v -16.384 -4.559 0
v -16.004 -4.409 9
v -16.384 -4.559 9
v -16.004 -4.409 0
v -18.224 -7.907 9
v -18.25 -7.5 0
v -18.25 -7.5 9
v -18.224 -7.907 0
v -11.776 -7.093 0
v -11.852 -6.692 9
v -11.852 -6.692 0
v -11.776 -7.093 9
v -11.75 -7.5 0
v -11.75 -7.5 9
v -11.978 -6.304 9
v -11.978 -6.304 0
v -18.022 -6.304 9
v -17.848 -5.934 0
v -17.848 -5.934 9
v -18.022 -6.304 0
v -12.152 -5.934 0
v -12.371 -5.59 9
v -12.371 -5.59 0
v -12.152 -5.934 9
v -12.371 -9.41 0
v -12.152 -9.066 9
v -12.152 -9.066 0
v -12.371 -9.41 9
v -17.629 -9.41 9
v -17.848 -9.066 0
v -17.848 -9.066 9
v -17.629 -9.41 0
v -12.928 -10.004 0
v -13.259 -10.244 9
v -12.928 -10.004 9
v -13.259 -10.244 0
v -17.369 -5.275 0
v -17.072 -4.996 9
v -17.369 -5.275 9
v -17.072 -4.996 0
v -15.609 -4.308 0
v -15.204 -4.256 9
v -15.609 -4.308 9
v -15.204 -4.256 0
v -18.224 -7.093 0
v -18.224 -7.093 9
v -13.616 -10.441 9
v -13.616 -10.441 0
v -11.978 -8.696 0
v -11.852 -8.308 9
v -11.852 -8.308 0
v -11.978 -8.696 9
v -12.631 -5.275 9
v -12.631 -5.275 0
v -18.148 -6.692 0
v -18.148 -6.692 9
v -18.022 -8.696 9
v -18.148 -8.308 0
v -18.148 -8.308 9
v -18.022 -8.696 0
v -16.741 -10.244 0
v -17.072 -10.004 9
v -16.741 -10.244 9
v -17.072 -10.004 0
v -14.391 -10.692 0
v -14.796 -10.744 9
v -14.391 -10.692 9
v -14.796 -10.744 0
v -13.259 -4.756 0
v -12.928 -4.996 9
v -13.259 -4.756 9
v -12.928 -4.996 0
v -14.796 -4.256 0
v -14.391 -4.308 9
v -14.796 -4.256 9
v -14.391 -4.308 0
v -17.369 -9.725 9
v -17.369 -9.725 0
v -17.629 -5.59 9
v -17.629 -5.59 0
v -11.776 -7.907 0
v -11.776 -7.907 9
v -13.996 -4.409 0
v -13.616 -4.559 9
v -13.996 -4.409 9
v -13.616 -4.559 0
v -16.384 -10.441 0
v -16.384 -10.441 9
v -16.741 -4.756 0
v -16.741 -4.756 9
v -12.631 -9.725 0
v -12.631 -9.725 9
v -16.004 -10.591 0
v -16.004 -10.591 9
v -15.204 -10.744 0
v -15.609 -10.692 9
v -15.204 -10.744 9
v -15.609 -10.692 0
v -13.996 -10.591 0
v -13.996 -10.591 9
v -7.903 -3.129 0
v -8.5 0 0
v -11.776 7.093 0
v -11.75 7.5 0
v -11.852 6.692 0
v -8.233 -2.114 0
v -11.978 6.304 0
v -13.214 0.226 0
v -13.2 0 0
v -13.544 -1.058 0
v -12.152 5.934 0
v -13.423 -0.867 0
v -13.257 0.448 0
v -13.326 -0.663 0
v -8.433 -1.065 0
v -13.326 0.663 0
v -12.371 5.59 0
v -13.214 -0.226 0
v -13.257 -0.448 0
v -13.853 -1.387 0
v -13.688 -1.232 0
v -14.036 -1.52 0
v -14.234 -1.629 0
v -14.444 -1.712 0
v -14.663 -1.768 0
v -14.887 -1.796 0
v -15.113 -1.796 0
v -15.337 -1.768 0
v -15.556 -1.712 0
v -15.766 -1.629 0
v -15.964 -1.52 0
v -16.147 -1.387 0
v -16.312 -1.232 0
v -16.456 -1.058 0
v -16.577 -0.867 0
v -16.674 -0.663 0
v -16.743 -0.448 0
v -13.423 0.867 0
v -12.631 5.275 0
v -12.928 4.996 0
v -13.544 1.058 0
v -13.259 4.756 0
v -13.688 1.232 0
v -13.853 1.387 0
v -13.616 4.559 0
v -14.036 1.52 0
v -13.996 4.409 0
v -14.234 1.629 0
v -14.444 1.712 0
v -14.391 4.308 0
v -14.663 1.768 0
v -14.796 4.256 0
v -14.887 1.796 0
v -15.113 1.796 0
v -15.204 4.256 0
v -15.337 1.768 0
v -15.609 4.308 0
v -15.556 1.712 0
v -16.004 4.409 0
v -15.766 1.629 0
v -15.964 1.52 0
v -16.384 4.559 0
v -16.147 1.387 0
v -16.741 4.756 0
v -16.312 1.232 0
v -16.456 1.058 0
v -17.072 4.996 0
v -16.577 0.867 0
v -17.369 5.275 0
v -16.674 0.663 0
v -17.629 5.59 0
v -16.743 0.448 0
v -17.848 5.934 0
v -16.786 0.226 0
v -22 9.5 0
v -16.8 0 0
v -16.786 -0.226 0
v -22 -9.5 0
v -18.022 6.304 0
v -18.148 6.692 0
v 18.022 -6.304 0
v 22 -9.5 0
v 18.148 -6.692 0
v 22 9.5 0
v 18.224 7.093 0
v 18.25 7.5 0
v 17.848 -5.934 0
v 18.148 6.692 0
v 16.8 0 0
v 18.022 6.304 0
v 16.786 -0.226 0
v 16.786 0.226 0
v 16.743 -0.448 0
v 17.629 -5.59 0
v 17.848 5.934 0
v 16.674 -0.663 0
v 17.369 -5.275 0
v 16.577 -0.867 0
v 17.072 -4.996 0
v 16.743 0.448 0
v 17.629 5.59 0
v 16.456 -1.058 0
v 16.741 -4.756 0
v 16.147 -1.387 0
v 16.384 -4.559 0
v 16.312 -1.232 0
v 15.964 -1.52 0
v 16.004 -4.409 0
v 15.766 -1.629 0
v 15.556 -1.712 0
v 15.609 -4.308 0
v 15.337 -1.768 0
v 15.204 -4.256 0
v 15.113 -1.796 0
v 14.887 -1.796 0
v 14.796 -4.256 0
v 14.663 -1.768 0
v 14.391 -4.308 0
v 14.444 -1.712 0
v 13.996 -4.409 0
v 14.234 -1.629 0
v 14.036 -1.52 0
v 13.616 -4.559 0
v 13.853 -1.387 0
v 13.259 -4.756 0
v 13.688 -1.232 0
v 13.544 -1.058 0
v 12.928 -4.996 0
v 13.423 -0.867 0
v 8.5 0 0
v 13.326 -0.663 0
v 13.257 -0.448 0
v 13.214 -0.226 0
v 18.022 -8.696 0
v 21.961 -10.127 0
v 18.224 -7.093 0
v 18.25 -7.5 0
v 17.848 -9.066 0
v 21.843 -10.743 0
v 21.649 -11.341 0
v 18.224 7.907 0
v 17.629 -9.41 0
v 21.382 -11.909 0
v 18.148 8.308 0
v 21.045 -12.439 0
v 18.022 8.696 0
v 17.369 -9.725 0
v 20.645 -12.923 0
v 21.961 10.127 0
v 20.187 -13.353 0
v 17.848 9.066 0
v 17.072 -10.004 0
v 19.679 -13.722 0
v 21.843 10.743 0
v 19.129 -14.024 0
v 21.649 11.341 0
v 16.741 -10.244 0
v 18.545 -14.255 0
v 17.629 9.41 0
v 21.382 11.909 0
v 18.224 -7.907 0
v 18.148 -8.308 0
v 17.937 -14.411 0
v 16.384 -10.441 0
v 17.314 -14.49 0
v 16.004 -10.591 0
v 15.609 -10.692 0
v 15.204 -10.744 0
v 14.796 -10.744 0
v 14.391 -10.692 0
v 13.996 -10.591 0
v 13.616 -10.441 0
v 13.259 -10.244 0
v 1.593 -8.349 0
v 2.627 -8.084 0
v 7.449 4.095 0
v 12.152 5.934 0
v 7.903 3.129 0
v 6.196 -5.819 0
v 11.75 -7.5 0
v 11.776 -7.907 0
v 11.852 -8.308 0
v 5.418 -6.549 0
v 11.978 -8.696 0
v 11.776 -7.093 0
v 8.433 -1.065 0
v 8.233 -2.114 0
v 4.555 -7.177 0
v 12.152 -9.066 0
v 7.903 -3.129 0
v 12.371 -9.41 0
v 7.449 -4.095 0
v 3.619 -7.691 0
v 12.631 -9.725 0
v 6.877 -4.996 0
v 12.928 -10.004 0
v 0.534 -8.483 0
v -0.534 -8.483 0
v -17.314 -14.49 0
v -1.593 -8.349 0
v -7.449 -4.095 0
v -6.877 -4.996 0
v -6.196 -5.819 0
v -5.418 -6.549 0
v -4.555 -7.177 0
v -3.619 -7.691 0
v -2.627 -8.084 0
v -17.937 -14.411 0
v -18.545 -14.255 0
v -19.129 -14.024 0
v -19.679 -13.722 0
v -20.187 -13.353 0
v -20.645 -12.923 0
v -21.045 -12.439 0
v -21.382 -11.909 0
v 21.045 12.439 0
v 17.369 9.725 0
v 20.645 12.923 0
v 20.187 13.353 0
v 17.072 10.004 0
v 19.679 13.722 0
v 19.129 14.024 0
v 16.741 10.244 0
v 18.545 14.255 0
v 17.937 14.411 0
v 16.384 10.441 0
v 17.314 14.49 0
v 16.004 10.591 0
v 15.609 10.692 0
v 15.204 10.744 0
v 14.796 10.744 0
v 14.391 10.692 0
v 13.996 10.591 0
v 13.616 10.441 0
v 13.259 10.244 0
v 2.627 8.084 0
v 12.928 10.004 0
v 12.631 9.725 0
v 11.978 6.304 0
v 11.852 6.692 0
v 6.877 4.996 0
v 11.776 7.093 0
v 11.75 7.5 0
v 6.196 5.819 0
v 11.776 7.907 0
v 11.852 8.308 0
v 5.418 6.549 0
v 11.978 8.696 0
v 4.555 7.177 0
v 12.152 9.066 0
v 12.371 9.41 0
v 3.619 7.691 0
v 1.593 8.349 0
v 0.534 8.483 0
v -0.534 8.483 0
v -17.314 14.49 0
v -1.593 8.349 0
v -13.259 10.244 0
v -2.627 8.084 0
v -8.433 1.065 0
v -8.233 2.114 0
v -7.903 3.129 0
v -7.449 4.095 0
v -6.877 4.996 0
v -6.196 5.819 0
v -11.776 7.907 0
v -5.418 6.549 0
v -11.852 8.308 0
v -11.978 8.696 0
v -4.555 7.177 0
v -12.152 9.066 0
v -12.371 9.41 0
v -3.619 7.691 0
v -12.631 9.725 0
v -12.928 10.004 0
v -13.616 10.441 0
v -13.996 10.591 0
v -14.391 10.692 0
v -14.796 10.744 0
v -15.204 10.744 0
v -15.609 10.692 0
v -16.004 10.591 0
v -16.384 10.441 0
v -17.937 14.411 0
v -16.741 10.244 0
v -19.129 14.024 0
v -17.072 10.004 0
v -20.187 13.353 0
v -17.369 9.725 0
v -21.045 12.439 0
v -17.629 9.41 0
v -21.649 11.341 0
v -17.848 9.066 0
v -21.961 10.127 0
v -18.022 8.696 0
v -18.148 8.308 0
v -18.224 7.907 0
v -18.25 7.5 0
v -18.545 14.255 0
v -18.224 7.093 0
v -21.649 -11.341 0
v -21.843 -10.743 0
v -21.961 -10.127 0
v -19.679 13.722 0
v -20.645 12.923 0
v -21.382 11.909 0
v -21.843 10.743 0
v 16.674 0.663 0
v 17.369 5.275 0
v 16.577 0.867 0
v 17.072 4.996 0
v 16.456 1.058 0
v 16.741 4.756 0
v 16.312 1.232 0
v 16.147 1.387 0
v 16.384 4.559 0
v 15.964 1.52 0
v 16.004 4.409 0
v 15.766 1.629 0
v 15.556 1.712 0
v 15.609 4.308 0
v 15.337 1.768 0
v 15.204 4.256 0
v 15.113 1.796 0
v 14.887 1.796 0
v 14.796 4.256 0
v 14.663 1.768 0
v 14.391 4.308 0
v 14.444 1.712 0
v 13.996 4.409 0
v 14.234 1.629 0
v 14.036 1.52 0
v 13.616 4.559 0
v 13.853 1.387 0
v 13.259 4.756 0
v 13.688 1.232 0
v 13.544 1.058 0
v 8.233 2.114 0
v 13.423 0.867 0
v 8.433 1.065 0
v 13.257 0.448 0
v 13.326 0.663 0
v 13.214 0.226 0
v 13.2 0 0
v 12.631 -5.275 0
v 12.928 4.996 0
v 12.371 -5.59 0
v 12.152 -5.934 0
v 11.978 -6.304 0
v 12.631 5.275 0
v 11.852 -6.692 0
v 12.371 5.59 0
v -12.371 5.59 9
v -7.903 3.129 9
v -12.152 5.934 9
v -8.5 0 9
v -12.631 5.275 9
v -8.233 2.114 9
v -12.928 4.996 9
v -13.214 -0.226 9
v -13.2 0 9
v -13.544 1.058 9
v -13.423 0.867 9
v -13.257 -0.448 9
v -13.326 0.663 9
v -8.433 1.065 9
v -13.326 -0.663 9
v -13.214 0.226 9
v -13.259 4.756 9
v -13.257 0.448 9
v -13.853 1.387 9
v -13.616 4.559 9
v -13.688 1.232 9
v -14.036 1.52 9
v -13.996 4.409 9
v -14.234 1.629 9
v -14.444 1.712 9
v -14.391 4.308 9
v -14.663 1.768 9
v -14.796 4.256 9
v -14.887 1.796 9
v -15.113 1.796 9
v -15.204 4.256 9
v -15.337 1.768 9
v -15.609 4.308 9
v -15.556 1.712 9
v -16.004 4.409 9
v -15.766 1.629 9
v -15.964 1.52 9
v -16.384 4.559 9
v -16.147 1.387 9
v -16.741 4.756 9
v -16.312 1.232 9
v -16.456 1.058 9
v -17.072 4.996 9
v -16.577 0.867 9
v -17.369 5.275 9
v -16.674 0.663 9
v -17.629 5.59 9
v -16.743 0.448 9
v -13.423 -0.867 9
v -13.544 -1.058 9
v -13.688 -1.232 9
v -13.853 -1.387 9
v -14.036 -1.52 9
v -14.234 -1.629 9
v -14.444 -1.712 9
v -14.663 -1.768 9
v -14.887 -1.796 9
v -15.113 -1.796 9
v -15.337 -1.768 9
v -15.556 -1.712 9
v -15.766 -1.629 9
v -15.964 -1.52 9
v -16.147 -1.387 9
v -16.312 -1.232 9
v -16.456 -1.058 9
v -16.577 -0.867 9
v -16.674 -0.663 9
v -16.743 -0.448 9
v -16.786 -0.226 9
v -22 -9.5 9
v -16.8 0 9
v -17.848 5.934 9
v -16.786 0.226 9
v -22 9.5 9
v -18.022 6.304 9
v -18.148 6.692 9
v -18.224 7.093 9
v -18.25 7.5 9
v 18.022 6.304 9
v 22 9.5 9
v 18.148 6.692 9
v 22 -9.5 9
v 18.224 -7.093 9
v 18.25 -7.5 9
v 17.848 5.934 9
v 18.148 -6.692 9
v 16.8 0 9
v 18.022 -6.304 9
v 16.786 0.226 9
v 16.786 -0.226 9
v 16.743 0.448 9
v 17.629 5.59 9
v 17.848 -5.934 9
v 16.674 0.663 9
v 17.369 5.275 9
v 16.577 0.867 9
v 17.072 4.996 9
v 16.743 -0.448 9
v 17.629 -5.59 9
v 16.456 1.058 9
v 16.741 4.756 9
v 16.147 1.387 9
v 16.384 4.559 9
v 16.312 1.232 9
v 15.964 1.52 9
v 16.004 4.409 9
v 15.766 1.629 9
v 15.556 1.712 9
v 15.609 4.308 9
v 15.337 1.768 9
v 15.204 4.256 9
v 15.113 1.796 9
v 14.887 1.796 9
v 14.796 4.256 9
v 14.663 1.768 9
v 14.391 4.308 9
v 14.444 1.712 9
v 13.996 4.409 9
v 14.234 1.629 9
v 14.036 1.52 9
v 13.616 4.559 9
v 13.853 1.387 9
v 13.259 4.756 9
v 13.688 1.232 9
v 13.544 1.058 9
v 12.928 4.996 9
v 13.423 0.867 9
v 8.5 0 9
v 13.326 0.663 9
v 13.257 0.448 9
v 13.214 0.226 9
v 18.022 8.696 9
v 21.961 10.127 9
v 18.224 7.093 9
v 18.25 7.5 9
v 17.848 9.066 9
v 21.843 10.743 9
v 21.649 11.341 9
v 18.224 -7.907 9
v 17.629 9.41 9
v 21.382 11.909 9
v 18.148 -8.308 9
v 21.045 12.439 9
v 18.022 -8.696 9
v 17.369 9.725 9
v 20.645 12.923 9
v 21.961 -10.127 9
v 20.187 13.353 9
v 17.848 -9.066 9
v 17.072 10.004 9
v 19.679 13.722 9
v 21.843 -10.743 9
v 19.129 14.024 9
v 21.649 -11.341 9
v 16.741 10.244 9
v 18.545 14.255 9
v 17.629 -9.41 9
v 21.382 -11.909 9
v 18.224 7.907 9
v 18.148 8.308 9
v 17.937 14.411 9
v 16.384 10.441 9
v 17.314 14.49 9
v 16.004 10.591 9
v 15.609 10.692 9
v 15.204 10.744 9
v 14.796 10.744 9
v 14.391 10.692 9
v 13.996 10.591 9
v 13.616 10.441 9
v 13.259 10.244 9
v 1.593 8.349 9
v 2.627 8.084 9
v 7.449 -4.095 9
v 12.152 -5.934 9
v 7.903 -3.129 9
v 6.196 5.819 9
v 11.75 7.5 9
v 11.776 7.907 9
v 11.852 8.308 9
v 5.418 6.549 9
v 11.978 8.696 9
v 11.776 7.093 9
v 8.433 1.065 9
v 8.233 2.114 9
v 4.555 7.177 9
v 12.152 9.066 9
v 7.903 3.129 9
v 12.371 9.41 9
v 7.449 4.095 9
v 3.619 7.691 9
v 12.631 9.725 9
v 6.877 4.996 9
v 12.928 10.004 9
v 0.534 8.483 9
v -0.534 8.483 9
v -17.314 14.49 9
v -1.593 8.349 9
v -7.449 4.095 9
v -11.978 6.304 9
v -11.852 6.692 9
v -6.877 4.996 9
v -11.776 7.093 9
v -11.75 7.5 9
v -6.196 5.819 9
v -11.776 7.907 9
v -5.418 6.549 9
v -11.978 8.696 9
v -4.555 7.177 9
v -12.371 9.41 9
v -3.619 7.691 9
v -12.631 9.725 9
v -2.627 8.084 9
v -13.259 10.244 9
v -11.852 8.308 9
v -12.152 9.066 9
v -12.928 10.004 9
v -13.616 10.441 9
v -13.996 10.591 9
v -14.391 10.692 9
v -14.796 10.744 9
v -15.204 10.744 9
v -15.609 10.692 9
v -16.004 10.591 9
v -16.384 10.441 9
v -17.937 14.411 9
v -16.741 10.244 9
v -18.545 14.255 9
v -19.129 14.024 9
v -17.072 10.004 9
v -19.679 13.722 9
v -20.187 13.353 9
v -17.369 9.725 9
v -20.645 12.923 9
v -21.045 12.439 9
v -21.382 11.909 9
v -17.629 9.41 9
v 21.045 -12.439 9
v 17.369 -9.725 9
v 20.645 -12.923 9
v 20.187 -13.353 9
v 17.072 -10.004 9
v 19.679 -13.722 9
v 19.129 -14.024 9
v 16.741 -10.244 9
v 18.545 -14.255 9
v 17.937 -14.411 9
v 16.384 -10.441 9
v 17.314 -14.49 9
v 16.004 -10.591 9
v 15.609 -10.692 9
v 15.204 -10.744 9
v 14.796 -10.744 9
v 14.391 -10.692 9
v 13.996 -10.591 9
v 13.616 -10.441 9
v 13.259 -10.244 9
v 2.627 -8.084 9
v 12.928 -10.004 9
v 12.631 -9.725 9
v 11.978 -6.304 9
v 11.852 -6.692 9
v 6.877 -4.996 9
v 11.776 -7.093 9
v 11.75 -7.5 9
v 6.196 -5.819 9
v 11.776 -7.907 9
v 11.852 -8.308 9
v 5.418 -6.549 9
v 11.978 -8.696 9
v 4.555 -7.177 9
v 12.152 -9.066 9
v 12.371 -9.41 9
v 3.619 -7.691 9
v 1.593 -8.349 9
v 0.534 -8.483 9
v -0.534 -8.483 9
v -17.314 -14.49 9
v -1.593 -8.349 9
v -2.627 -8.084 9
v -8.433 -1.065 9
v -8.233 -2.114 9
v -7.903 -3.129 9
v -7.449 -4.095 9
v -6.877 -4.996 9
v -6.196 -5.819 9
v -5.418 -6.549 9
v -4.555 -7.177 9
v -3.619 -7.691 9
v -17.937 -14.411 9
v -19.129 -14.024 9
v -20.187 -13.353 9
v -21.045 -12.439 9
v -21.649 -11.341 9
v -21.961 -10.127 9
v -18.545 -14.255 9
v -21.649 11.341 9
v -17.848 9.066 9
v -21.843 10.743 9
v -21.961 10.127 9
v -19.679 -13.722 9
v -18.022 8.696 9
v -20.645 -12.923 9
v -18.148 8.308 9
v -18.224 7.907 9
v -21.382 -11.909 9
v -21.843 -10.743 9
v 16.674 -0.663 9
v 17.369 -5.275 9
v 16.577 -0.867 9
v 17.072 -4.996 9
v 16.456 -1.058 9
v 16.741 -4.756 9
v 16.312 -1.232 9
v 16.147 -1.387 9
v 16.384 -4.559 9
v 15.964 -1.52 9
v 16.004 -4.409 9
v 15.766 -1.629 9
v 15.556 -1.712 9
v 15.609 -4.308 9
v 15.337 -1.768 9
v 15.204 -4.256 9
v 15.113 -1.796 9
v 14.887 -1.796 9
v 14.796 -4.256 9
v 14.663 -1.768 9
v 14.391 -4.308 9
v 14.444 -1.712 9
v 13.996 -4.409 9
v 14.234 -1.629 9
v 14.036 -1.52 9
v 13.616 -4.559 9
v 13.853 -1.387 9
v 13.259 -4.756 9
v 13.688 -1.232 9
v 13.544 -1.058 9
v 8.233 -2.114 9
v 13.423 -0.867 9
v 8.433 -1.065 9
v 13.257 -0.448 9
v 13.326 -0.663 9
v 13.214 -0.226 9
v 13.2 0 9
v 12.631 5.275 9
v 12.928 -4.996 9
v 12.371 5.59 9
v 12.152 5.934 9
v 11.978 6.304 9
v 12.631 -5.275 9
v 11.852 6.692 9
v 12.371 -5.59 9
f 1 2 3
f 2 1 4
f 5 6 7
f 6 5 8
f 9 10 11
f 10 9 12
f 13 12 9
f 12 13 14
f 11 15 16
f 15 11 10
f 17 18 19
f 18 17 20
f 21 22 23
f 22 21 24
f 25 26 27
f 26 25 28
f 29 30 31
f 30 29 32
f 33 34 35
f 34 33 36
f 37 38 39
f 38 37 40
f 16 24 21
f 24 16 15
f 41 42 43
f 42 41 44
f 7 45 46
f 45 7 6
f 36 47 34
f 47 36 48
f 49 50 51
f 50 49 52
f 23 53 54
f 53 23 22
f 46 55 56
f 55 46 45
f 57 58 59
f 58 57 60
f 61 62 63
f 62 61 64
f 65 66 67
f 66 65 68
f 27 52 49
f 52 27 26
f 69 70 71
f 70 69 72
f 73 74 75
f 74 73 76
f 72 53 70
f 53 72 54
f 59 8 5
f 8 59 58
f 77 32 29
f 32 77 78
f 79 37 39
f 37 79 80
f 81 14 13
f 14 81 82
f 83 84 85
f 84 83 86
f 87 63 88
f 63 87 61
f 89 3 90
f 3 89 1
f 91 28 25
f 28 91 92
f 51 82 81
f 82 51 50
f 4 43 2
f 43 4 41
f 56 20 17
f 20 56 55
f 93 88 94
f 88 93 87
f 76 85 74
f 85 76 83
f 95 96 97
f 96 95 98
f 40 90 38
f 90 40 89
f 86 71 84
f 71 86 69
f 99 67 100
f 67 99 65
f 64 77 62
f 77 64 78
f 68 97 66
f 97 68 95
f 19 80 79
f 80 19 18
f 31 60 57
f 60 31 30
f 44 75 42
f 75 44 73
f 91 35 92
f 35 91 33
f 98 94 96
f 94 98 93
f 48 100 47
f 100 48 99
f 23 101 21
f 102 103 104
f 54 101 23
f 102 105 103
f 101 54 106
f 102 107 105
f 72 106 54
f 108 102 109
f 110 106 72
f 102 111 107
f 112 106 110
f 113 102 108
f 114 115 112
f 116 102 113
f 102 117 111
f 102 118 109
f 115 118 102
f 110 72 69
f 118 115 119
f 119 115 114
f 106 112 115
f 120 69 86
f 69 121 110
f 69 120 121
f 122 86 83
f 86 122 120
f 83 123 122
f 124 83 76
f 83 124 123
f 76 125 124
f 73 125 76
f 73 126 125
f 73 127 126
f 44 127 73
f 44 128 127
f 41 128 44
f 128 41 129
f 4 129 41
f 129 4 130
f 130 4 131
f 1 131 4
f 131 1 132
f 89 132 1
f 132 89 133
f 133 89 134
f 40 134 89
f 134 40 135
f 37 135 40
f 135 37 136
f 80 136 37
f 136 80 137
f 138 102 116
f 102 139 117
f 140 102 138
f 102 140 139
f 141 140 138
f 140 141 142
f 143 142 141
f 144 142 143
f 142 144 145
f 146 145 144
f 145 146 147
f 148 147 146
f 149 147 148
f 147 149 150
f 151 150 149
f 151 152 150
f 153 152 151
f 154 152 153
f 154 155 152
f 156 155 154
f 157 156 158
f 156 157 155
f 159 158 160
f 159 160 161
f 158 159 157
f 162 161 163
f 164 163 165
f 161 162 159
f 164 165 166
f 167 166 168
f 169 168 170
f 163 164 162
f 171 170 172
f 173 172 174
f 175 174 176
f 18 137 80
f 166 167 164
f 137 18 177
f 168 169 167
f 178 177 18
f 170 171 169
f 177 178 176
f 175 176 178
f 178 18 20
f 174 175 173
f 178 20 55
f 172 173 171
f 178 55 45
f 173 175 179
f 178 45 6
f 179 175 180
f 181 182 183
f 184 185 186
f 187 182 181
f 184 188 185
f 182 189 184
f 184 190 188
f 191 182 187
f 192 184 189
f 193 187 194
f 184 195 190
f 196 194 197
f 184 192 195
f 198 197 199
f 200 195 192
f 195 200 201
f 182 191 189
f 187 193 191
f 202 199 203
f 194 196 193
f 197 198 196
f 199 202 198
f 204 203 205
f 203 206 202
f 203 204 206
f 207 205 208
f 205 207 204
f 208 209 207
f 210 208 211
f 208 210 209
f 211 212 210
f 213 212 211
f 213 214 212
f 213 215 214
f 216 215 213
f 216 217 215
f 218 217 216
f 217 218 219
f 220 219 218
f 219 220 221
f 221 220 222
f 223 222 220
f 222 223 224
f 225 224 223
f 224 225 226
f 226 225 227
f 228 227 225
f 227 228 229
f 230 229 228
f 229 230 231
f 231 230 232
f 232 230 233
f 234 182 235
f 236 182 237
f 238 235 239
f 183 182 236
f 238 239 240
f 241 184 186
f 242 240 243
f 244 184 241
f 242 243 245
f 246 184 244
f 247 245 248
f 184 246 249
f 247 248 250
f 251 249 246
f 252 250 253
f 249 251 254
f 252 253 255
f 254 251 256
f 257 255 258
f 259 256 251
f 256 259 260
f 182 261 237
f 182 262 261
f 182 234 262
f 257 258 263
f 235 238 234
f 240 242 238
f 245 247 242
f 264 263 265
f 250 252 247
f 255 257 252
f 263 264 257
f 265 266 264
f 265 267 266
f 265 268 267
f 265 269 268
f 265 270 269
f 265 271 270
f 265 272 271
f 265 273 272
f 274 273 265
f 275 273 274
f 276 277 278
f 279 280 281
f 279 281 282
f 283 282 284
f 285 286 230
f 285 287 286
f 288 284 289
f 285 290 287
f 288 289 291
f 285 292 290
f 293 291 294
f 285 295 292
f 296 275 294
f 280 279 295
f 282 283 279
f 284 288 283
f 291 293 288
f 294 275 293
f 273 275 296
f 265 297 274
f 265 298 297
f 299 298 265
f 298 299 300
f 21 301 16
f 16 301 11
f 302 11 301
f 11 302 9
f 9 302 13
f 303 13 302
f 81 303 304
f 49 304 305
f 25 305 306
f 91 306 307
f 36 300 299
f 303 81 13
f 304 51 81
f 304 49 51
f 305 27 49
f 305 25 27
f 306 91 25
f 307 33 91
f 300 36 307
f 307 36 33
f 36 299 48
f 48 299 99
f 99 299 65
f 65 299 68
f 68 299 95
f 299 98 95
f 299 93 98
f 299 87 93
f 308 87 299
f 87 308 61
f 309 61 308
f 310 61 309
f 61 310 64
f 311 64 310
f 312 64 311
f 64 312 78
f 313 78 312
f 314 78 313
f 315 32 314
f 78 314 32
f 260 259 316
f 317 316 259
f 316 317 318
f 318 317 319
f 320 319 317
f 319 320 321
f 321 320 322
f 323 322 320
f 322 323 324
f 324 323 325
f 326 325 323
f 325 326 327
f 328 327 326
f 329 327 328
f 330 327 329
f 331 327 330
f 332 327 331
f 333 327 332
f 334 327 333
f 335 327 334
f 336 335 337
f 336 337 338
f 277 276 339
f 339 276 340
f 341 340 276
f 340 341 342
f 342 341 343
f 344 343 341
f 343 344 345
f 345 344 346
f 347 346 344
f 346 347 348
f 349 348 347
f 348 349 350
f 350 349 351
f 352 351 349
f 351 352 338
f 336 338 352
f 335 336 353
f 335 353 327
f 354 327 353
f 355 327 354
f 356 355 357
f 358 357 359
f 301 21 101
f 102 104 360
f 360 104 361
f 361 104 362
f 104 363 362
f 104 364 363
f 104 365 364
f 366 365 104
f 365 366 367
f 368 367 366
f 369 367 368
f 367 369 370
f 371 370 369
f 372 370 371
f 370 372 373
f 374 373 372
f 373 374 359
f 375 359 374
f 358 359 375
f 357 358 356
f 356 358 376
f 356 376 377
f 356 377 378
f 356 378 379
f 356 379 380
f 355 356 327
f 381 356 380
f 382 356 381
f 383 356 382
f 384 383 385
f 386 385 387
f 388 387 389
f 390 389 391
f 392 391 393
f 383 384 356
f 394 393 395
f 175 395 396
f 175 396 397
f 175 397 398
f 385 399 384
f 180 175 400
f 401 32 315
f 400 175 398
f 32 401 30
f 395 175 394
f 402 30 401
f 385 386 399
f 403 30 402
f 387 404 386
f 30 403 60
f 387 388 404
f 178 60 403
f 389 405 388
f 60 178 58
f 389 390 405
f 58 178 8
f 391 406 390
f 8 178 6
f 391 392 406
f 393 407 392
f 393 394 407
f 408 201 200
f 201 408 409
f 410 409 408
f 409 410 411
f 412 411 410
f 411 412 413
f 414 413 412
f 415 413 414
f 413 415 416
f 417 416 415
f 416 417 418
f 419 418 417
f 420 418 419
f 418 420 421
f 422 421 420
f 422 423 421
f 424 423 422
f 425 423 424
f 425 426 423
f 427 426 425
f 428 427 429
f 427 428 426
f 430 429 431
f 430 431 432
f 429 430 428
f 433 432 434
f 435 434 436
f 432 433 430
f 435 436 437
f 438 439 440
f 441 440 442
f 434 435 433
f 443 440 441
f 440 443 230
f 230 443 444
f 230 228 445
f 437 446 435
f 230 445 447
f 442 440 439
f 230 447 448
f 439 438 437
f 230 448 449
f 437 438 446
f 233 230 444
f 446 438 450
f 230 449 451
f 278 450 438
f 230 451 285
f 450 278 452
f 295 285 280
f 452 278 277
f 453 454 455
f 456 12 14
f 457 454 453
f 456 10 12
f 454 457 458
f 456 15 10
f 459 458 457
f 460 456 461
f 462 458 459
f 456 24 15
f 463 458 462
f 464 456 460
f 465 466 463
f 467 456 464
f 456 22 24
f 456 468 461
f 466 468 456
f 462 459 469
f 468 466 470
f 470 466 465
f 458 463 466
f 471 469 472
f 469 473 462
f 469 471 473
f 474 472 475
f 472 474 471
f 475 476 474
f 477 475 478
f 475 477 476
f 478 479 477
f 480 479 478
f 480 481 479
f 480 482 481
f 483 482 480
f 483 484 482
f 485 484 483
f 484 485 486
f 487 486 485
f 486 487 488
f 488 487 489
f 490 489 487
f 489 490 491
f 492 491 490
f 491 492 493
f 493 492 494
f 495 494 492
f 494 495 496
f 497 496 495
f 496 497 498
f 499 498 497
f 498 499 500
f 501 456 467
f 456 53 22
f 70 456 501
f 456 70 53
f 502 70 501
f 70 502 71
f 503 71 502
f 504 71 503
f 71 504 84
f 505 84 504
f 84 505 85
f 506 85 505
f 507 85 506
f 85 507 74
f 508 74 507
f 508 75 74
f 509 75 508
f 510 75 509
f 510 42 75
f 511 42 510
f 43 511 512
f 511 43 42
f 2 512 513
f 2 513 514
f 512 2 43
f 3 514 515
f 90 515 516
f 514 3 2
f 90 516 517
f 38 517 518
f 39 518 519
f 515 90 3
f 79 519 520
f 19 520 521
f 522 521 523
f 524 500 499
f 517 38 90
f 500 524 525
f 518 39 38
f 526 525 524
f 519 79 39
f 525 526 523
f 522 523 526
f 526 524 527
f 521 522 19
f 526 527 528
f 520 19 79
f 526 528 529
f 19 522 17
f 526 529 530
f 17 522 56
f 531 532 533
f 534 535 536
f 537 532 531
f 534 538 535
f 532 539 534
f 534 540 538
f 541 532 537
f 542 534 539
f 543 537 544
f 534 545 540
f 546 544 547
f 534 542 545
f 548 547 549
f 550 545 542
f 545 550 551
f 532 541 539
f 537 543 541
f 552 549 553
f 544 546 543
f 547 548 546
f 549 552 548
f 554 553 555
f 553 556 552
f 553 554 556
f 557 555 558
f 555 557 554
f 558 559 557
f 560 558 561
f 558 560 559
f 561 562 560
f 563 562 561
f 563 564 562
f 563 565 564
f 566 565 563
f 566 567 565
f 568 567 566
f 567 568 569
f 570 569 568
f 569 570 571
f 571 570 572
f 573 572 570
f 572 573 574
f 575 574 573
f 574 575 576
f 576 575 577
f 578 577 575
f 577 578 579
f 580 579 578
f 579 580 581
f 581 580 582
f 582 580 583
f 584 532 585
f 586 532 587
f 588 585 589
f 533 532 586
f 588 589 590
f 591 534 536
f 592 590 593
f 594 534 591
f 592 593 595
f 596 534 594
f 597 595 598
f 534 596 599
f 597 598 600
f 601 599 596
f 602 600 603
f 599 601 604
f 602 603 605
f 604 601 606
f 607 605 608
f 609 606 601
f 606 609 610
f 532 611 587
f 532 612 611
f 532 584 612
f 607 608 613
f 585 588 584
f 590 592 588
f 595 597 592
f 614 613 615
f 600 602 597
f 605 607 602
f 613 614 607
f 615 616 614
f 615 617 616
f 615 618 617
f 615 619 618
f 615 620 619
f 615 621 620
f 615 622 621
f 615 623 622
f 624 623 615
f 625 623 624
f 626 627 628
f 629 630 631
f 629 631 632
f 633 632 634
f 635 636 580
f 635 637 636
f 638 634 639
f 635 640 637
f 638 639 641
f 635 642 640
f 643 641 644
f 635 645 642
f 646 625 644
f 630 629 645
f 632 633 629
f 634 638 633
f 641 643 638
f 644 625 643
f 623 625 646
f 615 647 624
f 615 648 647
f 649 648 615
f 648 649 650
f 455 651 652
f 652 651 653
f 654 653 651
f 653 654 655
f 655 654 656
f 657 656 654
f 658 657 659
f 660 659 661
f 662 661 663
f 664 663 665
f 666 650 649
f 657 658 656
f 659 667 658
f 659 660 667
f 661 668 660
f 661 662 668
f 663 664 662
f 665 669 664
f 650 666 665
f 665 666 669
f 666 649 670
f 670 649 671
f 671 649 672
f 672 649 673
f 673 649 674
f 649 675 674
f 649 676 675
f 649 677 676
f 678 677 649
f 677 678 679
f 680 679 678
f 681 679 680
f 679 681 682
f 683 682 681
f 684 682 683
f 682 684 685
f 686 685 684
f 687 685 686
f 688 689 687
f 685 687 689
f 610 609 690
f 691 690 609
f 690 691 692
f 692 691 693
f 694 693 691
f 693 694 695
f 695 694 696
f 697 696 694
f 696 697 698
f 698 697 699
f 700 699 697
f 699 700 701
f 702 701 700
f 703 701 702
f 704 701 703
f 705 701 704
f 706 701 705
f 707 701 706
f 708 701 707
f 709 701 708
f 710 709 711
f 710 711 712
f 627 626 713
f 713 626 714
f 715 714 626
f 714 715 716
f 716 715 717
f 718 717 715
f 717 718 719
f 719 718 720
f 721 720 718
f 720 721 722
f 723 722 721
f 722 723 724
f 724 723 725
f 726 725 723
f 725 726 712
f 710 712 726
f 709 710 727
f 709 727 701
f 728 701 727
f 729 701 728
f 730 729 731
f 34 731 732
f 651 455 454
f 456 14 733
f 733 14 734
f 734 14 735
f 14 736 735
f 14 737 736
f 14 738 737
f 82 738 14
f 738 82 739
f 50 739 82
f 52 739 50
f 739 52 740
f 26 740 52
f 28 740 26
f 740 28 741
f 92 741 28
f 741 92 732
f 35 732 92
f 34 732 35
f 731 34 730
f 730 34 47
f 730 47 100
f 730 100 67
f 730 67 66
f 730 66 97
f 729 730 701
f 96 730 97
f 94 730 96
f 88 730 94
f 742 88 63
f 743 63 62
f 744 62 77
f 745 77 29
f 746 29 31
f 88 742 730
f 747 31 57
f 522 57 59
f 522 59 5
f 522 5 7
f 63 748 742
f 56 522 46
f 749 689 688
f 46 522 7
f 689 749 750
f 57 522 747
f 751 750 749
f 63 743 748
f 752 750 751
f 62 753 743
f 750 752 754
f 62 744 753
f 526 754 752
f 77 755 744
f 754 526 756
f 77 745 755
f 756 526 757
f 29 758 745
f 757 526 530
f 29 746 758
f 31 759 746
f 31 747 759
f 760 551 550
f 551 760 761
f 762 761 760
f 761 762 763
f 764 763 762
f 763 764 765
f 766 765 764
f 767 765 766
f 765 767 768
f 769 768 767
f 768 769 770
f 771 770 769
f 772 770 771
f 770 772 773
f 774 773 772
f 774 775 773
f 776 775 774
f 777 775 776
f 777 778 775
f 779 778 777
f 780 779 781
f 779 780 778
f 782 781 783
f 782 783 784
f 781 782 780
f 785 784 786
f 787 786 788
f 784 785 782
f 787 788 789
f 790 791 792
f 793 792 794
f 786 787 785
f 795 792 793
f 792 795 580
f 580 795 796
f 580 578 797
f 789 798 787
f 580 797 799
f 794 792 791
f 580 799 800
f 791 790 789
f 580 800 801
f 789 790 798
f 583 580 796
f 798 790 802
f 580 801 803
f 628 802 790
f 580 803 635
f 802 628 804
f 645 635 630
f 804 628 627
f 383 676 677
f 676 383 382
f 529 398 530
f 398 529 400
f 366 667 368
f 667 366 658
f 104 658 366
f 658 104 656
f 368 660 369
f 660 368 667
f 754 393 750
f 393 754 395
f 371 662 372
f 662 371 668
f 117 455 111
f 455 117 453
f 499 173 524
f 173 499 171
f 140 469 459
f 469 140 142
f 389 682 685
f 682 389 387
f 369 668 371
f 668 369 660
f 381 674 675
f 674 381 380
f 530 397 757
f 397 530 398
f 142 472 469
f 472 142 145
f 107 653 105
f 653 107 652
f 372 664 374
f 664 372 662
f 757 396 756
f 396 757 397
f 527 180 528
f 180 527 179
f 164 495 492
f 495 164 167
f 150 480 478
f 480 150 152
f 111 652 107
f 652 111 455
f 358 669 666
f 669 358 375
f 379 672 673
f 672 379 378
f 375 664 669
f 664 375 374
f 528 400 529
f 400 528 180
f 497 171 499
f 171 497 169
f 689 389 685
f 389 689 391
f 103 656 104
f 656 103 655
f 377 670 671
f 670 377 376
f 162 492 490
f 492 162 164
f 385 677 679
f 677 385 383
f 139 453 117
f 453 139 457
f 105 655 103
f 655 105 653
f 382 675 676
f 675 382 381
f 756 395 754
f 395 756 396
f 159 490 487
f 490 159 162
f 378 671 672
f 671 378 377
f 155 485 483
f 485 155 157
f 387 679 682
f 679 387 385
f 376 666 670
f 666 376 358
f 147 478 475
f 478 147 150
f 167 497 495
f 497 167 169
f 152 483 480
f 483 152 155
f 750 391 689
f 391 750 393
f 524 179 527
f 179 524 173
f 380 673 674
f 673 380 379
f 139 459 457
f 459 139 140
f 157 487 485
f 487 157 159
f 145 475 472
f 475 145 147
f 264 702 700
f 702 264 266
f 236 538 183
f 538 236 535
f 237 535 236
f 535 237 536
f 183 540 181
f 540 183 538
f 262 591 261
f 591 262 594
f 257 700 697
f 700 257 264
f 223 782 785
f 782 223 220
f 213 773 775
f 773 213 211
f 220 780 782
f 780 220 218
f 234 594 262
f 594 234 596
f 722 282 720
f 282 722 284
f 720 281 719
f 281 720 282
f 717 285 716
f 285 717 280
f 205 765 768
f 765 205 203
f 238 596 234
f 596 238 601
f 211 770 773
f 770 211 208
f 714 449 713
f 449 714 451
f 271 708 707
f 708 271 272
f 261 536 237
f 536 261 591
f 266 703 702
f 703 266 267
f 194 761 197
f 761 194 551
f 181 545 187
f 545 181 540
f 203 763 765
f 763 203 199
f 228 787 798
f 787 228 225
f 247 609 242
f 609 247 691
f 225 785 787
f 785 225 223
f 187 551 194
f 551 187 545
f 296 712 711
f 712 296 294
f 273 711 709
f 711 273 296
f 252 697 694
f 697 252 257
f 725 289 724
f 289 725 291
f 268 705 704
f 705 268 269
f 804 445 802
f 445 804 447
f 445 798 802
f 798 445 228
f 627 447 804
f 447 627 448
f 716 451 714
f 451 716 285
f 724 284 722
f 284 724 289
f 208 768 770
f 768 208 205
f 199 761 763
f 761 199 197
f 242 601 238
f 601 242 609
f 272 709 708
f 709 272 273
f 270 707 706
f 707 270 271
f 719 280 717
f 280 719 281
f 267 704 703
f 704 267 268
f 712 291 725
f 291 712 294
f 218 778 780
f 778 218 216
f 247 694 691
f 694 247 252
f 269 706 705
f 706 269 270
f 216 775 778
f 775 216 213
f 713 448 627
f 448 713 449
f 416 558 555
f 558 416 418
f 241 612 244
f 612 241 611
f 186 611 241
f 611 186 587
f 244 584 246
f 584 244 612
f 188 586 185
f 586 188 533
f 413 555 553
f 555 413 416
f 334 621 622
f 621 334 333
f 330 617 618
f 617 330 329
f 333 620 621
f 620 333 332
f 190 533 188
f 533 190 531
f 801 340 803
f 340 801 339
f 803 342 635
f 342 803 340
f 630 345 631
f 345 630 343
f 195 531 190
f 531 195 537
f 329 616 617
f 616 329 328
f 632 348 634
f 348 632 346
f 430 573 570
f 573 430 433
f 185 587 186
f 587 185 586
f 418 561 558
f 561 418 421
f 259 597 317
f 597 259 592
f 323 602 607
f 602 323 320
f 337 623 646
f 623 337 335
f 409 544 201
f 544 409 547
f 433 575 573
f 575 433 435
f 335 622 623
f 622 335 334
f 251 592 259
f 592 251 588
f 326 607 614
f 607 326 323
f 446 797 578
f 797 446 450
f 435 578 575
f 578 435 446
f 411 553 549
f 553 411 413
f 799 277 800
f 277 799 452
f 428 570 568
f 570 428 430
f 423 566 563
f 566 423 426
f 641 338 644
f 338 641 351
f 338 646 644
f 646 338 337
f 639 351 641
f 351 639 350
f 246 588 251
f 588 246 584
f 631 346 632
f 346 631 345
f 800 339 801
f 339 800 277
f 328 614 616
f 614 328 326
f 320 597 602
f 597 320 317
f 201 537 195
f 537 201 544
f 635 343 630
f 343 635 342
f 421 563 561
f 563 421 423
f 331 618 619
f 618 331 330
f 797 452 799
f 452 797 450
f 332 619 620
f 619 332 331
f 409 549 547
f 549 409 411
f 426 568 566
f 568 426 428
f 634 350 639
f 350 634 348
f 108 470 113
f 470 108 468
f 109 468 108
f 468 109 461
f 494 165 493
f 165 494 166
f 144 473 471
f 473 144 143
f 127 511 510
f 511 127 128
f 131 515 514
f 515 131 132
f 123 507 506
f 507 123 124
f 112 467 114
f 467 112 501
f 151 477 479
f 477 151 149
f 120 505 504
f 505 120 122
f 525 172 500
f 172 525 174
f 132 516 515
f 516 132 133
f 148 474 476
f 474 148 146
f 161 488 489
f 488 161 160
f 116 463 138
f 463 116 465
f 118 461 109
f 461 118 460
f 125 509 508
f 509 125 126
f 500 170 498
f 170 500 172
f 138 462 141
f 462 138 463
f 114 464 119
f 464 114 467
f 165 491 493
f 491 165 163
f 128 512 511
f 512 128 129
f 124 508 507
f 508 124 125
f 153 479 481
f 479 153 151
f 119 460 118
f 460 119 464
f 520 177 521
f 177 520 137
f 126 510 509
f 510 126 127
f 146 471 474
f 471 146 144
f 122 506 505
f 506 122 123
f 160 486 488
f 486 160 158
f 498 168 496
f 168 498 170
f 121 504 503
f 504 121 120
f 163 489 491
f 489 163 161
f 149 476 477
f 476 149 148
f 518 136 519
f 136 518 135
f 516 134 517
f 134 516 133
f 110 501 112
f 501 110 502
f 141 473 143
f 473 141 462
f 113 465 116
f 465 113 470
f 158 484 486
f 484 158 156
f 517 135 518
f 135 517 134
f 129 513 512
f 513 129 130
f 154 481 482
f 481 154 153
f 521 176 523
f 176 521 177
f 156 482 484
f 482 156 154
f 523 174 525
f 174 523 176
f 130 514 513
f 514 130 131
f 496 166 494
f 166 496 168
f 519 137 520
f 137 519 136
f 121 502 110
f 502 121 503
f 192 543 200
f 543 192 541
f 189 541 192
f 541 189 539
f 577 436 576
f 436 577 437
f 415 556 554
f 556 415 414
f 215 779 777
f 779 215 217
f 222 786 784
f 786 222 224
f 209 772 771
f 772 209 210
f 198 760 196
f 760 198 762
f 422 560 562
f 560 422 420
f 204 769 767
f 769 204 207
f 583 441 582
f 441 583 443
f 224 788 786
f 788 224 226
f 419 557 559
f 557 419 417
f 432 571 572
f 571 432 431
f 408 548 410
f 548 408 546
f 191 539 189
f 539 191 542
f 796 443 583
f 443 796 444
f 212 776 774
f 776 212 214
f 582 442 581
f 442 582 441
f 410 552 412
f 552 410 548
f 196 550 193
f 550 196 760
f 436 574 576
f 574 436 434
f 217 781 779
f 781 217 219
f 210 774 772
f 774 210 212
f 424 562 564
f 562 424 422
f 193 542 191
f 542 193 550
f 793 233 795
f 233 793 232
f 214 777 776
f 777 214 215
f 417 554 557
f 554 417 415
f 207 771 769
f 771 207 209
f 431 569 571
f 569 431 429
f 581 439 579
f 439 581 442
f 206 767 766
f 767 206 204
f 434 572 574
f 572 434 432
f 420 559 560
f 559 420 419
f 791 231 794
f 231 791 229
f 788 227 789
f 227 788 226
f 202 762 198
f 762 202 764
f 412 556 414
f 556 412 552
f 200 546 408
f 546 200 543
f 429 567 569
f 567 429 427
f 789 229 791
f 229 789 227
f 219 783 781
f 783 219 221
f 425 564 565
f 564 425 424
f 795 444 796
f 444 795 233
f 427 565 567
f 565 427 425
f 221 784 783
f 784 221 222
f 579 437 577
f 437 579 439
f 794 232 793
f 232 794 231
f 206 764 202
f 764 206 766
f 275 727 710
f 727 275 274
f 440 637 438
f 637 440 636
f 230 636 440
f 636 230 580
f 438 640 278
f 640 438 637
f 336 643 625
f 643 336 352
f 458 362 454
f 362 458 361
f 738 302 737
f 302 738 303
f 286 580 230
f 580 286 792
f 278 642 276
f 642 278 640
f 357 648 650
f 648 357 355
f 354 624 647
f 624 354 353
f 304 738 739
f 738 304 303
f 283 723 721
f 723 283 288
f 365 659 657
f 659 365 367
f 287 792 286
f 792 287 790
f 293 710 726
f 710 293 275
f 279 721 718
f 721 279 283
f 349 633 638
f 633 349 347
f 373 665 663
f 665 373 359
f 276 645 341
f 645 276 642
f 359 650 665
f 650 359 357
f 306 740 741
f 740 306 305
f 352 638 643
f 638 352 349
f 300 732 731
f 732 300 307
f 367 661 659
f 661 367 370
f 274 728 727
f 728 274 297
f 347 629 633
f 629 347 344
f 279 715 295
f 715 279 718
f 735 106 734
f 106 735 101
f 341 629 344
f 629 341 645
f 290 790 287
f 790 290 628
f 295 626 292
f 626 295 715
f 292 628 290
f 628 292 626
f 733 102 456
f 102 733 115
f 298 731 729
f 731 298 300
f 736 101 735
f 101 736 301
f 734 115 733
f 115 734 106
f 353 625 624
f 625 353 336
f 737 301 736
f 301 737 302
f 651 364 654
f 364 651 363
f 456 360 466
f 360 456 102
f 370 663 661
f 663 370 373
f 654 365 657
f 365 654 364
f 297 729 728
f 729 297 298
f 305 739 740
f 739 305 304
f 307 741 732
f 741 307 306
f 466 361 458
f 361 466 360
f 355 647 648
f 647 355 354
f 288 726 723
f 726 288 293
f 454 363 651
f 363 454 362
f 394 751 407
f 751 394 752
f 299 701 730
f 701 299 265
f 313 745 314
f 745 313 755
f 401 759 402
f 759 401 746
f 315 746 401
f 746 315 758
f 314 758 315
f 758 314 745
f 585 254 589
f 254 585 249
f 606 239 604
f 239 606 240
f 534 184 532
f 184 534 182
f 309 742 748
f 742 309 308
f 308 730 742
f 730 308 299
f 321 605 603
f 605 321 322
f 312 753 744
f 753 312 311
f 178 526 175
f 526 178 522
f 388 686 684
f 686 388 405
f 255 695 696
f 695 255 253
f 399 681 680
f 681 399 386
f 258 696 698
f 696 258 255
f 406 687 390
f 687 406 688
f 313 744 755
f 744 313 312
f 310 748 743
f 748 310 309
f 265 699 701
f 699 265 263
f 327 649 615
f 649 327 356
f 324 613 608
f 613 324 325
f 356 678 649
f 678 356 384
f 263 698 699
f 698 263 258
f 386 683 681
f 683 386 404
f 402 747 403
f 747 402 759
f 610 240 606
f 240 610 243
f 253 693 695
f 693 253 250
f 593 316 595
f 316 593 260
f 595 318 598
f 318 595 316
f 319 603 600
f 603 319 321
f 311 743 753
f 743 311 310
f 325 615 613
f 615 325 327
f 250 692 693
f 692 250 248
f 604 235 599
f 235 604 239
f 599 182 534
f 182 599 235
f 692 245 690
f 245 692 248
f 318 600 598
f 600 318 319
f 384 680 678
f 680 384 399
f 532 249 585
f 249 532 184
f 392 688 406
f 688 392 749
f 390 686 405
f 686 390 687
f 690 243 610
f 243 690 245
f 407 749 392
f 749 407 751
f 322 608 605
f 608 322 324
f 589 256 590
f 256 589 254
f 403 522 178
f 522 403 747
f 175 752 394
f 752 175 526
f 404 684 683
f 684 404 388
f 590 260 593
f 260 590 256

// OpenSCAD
$fn = 50;

difference() {
	union() {
		hull() {
			translate(v = [-17.0, 9.5, 0]) {
				cylinder(h = 9, r = 5);
			}
			translate(v = [17.0, 9.5, 0]) {
				cylinder(h = 9, r = 5);
			}
			translate(v = [-17.0, -9.5, 0]) {
				cylinder(h = 9, r = 5);
			}
			translate(v = [17.0, -9.5, 0]) {
				cylinder(h = 9, r = 5);
			}
		}
	}
	union() {
		translate(v = [-15.0, -7.5, 0]) {
			cylinder(h = 9, r = 3.25);
		}
		translate(v = [-15.0, 7.5, 0]) {
			cylinder(h = 9, r = 3.25);
		}
		translate(v = [15.0, -7.5, 0]) {
			cylinder(h = 9, r = 3.25);
		}
		translate(v = [15.0, 7.5, 0]) {
			cylinder(h = 9, r = 3.25);
		}
		translate(v = [-15.0, 0.0, 0]) {
			cylinder(h = 9, r = 1.8);
		}
		translate(v = [15.0, 0.0, 0]) {
			cylinder(h = 9, r = 1.8);
		}
		cylinder(h = 9, r = 8.5);
	}
}
